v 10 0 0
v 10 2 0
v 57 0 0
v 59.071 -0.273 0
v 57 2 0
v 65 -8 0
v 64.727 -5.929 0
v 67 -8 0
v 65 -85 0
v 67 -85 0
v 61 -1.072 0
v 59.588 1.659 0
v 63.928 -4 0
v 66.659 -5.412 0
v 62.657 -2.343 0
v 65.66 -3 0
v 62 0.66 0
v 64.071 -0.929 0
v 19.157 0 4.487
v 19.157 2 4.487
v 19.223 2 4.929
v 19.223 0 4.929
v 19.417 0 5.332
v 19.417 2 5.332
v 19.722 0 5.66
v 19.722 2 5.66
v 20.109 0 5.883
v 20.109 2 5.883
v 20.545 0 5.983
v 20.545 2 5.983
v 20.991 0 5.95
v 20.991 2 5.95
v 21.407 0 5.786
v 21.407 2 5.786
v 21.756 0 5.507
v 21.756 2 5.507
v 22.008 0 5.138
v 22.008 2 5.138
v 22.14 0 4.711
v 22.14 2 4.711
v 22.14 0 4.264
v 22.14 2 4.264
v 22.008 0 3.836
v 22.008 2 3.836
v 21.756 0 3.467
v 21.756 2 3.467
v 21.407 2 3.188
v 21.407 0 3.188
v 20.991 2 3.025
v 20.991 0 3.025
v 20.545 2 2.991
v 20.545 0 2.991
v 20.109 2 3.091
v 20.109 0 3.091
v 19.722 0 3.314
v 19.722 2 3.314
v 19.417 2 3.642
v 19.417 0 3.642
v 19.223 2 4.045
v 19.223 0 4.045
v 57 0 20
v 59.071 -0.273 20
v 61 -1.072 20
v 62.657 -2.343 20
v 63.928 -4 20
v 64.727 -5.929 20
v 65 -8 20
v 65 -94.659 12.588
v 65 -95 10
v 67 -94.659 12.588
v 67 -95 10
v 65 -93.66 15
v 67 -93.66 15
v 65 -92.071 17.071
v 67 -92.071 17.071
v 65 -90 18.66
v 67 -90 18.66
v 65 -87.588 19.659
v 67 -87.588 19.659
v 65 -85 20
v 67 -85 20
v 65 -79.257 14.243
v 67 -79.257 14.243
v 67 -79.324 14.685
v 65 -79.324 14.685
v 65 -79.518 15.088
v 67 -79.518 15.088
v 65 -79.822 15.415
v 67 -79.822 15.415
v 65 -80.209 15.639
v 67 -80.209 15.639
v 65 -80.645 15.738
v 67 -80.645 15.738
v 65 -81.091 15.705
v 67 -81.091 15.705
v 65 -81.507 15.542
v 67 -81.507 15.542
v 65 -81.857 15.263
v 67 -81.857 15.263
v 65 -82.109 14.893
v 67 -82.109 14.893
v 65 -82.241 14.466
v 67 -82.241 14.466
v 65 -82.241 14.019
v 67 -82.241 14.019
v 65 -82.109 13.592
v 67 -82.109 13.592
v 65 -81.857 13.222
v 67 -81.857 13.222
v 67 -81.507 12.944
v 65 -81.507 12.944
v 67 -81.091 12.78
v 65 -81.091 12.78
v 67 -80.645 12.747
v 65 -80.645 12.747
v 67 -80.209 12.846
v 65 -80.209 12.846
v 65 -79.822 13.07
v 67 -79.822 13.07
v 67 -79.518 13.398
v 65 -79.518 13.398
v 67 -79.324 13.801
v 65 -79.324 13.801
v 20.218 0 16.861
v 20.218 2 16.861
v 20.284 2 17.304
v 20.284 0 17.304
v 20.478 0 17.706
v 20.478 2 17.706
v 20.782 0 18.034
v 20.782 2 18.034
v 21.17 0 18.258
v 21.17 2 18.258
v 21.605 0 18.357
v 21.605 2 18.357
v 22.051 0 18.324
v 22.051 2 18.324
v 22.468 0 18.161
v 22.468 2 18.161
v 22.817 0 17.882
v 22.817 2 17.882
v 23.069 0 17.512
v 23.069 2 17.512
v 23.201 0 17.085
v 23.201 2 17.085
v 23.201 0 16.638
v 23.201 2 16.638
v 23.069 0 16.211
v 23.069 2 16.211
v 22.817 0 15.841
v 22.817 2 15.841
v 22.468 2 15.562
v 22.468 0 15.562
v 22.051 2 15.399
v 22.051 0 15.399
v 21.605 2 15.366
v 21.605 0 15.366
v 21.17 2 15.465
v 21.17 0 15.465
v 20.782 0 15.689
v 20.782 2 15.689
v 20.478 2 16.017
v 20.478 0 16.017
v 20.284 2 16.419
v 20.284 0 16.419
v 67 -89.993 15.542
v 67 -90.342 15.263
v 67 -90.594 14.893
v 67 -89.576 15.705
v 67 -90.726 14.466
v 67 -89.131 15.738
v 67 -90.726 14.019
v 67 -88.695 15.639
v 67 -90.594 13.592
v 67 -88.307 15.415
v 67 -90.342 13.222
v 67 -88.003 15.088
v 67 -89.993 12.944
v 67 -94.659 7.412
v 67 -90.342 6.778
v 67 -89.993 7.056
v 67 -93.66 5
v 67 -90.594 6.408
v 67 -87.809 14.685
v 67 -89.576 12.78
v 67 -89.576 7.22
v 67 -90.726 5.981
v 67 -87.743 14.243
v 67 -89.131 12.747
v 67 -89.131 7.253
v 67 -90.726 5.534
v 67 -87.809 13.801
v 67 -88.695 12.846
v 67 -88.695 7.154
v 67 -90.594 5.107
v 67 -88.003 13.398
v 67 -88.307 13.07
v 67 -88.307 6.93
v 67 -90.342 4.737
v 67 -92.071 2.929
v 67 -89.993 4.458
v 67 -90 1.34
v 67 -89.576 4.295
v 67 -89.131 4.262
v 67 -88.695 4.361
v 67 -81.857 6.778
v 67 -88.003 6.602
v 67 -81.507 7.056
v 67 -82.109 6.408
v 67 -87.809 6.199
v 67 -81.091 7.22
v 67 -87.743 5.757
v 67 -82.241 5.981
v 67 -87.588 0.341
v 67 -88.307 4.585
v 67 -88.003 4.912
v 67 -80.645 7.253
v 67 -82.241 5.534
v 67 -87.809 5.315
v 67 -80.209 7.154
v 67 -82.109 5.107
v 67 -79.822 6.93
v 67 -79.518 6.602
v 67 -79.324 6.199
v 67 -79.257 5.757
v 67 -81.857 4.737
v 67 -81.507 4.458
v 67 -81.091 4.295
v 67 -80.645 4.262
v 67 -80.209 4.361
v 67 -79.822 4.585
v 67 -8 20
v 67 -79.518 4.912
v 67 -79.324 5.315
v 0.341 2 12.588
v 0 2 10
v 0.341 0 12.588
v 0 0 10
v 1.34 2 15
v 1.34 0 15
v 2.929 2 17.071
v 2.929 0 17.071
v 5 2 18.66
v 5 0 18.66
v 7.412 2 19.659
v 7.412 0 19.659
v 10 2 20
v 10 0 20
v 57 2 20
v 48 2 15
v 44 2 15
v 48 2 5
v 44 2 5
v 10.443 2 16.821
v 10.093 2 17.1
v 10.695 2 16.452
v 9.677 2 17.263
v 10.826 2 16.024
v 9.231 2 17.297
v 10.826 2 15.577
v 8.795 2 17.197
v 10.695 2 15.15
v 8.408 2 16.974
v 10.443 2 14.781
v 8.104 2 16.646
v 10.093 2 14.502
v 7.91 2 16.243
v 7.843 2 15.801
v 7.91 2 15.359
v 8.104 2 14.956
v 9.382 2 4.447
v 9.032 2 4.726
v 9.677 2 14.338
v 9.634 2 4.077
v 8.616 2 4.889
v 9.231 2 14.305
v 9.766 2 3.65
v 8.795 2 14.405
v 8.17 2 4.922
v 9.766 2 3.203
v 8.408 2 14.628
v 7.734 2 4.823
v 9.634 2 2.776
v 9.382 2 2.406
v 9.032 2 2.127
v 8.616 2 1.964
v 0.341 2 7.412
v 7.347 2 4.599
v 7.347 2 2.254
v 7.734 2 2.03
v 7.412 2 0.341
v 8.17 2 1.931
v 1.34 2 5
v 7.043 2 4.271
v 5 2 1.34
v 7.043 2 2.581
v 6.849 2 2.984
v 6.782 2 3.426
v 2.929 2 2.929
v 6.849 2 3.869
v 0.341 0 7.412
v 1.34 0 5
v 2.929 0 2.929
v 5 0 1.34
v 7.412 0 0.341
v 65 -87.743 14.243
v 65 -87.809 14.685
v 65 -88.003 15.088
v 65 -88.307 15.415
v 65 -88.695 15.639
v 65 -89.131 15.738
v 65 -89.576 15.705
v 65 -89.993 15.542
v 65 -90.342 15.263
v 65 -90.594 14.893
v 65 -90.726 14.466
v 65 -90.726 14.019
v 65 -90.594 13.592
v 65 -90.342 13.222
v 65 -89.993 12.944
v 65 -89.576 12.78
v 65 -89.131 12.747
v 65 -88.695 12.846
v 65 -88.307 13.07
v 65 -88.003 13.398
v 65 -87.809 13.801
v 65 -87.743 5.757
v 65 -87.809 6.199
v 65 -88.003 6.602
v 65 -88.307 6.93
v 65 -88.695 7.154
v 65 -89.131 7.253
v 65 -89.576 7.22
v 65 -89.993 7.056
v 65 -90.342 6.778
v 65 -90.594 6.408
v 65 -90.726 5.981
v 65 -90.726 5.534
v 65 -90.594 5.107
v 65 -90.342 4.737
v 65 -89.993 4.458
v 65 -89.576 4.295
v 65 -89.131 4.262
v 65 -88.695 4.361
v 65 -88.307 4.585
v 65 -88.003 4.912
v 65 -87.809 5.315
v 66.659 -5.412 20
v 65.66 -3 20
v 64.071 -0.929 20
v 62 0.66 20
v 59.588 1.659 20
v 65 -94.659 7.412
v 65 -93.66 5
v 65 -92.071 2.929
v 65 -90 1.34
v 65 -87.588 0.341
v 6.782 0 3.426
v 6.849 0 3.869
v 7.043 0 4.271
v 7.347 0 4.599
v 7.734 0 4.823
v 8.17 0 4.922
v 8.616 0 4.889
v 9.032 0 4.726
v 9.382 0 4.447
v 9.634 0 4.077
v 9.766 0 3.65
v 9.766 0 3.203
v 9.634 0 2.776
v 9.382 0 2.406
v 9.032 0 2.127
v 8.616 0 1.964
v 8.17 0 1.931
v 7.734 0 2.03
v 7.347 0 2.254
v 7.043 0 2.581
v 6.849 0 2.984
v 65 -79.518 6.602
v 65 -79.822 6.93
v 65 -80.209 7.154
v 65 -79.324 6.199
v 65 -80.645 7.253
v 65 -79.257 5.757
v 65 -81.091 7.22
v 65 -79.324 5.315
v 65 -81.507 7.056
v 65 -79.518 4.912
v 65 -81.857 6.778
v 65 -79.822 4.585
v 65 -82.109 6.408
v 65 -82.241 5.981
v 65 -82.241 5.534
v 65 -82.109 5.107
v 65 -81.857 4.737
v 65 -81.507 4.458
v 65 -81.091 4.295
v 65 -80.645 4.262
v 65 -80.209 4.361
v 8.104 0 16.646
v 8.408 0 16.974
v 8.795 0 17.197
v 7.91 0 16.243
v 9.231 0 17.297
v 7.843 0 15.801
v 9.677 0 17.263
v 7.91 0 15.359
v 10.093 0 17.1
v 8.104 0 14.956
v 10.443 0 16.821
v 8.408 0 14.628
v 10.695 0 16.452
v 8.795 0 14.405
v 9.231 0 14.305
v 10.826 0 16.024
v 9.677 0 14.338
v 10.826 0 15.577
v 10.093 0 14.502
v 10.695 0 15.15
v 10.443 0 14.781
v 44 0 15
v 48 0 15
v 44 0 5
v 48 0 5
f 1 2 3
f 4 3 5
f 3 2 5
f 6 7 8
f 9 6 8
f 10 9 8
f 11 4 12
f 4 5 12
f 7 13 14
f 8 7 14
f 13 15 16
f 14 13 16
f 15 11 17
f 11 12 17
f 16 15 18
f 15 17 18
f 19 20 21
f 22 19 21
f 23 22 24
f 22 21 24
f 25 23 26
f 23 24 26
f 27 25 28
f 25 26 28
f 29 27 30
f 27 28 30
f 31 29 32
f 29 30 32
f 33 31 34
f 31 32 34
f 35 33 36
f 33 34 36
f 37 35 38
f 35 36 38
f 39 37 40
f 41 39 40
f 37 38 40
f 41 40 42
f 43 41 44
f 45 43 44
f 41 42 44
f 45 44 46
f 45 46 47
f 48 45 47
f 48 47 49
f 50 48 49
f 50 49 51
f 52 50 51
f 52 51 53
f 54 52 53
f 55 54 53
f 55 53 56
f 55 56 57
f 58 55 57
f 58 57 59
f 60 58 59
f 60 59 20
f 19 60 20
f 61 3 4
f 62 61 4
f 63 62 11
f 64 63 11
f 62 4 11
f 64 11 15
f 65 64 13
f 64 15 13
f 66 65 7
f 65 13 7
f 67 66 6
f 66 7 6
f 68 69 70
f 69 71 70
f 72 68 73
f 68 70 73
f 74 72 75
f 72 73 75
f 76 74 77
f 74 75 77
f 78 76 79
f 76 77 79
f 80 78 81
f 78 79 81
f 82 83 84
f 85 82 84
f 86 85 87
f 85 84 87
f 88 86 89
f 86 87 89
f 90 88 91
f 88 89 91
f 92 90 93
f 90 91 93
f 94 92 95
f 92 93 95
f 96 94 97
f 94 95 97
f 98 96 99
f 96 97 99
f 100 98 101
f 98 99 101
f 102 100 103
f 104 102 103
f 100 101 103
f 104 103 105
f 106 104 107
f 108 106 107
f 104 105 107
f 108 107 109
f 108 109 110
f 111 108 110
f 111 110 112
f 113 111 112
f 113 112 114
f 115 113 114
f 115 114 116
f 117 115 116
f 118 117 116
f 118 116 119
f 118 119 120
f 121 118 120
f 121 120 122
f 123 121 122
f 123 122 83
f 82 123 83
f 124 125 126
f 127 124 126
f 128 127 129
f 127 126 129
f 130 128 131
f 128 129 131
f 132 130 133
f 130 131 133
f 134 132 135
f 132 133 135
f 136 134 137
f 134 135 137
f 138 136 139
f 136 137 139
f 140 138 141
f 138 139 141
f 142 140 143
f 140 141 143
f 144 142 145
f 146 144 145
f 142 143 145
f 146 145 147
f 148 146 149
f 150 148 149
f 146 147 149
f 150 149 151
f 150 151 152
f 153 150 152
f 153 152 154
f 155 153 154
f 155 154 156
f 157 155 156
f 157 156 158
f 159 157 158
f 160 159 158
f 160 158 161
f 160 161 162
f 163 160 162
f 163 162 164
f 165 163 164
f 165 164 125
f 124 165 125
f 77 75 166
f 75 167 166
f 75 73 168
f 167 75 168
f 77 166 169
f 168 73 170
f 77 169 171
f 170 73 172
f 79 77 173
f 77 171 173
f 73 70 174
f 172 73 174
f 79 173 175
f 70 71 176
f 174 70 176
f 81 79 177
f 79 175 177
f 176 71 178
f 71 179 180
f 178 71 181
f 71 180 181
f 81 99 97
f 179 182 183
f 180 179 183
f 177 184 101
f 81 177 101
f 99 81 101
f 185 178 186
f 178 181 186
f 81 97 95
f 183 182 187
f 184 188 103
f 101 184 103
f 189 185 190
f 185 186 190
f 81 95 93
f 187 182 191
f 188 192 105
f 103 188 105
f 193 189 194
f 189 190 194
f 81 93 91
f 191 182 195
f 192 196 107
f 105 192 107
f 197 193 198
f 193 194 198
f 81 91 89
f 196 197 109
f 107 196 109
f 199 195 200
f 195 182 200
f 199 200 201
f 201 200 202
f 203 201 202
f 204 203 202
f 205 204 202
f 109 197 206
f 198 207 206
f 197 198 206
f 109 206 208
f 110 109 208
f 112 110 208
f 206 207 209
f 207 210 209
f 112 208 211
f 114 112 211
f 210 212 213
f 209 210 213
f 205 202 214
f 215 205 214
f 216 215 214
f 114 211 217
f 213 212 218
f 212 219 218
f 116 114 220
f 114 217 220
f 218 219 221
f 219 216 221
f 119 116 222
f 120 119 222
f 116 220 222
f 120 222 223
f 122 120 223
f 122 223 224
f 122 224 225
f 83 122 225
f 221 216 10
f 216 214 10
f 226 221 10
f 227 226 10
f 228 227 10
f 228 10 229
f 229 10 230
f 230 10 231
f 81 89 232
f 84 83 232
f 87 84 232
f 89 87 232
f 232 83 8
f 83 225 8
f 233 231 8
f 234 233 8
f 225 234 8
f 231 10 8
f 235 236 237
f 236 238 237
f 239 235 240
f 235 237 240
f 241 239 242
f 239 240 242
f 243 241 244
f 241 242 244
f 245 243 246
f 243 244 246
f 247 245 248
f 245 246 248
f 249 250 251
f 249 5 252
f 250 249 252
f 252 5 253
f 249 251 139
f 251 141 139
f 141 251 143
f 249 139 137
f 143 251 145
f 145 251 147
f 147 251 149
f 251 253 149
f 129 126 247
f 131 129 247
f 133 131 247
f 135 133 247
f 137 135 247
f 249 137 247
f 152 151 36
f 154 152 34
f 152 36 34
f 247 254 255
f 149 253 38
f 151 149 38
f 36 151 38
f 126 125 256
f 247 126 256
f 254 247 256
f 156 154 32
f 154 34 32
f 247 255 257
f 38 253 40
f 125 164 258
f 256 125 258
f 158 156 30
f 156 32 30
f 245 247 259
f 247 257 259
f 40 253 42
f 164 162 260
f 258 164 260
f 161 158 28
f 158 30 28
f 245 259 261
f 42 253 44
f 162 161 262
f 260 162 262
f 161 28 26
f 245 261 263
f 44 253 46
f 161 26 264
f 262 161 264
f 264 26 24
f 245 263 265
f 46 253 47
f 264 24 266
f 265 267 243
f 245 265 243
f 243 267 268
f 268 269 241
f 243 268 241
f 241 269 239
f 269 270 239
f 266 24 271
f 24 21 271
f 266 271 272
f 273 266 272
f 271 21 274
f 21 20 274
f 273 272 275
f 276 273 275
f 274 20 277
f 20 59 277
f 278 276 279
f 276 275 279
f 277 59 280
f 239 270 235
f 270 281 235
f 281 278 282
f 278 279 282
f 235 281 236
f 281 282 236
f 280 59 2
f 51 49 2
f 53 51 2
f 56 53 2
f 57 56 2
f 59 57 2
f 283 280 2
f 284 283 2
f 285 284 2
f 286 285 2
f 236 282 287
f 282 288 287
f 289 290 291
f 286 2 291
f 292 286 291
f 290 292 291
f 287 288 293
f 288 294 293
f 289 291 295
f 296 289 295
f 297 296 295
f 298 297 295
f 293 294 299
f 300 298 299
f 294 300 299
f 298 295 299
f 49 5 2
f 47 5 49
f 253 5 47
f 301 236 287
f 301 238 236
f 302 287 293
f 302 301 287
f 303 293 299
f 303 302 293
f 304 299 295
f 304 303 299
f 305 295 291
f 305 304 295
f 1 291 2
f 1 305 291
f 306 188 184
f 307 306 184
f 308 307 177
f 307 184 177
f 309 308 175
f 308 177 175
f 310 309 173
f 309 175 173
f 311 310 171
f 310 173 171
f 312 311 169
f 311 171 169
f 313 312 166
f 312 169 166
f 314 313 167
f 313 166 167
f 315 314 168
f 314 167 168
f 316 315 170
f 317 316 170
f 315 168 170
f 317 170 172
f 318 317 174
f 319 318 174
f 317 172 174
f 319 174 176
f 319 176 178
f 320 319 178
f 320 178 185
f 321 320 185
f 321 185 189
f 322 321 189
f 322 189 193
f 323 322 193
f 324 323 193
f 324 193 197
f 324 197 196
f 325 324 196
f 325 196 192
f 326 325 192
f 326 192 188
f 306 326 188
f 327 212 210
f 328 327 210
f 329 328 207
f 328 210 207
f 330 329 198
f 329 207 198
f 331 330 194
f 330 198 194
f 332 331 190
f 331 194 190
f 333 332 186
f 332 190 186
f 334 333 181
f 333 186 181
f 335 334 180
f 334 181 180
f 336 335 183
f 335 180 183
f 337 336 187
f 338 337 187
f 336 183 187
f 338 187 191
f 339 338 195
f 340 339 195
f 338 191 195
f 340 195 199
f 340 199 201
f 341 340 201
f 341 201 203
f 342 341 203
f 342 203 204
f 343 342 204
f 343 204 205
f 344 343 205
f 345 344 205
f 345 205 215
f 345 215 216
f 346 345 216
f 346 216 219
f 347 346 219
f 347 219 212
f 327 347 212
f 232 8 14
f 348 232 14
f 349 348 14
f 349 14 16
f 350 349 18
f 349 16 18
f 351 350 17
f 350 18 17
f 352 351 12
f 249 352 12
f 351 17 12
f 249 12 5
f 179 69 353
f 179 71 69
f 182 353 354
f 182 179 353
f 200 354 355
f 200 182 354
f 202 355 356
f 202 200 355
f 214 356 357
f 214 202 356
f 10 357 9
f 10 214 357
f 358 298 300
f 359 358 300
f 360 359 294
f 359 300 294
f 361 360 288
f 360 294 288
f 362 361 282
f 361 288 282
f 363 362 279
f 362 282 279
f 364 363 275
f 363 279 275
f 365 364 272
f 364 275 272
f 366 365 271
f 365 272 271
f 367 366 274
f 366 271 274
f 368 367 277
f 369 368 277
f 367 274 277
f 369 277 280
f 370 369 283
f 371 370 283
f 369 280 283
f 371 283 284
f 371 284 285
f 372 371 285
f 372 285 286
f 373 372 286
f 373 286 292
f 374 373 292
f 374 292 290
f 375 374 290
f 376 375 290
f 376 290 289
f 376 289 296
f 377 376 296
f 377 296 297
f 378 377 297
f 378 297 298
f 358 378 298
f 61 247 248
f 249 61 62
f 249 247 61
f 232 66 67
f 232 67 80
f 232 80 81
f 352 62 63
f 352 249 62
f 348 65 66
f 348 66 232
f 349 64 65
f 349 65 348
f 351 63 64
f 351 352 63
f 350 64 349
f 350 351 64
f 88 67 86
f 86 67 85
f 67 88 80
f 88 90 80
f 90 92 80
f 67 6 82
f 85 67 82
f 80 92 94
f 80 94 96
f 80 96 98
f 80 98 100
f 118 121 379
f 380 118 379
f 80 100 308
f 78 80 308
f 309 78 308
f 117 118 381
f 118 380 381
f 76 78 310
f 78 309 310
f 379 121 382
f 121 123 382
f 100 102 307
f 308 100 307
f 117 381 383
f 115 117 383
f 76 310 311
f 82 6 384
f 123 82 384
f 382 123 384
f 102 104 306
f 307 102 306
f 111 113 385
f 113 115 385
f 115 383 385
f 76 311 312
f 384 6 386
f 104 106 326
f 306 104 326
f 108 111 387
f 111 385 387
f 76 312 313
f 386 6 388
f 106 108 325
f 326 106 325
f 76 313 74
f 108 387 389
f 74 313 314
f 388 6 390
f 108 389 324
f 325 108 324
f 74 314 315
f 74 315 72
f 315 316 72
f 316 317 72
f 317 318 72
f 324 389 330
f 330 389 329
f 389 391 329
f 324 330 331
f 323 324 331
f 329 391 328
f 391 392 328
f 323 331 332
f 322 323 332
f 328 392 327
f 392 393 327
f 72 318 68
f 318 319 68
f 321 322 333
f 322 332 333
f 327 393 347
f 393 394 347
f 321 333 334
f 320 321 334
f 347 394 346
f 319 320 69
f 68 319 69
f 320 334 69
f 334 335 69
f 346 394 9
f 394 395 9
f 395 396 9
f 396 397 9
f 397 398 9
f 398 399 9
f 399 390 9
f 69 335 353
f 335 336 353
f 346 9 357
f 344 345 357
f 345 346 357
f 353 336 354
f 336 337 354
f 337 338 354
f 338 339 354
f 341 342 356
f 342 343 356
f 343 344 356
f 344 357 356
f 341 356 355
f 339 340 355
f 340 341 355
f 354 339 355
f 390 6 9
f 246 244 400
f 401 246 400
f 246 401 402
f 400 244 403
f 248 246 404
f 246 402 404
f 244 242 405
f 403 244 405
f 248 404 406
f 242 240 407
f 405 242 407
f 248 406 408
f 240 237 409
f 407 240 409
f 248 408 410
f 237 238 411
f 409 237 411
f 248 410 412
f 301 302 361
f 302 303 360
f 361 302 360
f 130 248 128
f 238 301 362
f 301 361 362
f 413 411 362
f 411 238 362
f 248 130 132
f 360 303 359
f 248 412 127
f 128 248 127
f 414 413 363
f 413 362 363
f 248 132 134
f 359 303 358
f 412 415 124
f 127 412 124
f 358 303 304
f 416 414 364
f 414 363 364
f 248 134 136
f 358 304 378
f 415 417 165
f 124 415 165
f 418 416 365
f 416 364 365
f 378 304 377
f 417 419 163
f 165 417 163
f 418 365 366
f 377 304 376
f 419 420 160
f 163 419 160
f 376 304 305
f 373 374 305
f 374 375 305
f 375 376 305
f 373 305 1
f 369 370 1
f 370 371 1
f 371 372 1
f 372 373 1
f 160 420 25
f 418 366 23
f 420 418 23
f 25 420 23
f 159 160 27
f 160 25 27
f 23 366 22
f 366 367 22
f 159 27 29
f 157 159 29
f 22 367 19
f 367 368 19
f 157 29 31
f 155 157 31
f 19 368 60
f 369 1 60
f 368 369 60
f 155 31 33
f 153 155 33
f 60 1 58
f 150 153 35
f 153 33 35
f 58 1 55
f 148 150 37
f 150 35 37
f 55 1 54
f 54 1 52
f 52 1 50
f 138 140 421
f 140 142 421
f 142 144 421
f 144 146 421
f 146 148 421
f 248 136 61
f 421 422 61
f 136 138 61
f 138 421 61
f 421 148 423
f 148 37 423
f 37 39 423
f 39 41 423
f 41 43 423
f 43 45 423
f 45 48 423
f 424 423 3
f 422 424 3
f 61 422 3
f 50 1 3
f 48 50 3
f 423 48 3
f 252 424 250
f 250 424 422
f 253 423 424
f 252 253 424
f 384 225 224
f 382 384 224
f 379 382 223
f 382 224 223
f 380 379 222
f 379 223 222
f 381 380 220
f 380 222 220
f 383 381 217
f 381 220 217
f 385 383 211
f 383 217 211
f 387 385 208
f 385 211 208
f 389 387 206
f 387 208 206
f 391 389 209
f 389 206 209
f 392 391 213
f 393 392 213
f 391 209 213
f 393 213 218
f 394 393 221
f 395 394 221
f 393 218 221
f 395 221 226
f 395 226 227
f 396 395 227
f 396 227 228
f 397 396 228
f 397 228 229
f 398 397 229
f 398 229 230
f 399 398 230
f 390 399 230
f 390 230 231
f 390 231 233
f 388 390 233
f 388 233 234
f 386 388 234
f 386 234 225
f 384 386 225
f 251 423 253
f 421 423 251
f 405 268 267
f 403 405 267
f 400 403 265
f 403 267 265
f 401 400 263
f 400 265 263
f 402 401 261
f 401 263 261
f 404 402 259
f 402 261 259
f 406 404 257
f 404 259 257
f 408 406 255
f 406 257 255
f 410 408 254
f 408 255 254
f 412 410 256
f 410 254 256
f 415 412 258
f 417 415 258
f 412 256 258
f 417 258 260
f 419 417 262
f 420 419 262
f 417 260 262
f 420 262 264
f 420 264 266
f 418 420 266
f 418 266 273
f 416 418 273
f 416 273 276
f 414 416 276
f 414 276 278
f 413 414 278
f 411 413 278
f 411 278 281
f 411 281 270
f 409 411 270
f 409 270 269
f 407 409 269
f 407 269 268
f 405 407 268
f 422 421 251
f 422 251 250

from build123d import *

# Parameters (mm, degrees)
F1_DEPTH = 20
F4_R     = 9.99999
F6_D     = 3
F2_W     = 4
F2_H     = 10
F7_DEPTH = 25
F8_D     = 3


# Not quite as in the source:
# - a fillet or chamfer is up to 0.001 mm smaller than in the source, because OpenCascade refuses the exact size
# - a feature names something its author has since deleted; it is built from what else it names


with BuildPart() as f1:
    # F0 (on Top) → F1 (new body)
    with BuildSketch(Plane.XY):
        with BuildLine():
            Line((0, 2), (0, 0))
            Line((0, 0), (57, 0))
            ThreePointArc((57, 0), (62.6568542495, -2.3431457505), (65, -8))
            Line((65, -8), (65, -95))
            Line((65, -95), (67, -95))
            Line((67, -95), (67, -8))
            ThreePointArc((67, -8), (64.0710678119, -0.9289321881), (57, 2))
            Line((57, 2), (0, 2))
        make_face()
    extrude(amount=F1_DEPTH)

    # F4 (radius 10 in the source; OpenCascade refuses exactly that, so slightly less here)
    f4_edges = [f1.edges().sort_by_distance(p)[0] for p in [
        (0, 1, 20),
        (0, 1, 0),
        (66, -95, 20),
        (66, -95, 0),
    ]]
    fillet(f4_edges, radius=F4_R)

    # F6 (through all)
    with Locations(Plane(origin=(65, 0, 0), x_dir=(0, -1, 0), z_dir=(-1, 0, 0))):
        with Locations((80.7573593129, 14.2426406871), (80.7573593129, 5.7573593129), (89.2426406871, 5.7573593129), (89.2426406871, 14.2426406871)):
            Hole(F6_D / 2)

    # F2 (on face) → F7 (cut)
    with BuildSketch(Plane.XZ):
        with Locations((46, 10)):
            Rectangle(F2_W, F2_H)
    extrude(amount=-F7_DEPTH, mode=Mode.SUBTRACT)

    # F8 (through all)
    with Locations(Plane.XZ):
        with Locations((8.2824855787, 3.4264645687), (21.7175144213, 16.8614934112), (20.6568542495, 4.4871247404), (9.3431457505, 15.8008332394)):
            Hole(F8_D / 2)


solid = f1.part
